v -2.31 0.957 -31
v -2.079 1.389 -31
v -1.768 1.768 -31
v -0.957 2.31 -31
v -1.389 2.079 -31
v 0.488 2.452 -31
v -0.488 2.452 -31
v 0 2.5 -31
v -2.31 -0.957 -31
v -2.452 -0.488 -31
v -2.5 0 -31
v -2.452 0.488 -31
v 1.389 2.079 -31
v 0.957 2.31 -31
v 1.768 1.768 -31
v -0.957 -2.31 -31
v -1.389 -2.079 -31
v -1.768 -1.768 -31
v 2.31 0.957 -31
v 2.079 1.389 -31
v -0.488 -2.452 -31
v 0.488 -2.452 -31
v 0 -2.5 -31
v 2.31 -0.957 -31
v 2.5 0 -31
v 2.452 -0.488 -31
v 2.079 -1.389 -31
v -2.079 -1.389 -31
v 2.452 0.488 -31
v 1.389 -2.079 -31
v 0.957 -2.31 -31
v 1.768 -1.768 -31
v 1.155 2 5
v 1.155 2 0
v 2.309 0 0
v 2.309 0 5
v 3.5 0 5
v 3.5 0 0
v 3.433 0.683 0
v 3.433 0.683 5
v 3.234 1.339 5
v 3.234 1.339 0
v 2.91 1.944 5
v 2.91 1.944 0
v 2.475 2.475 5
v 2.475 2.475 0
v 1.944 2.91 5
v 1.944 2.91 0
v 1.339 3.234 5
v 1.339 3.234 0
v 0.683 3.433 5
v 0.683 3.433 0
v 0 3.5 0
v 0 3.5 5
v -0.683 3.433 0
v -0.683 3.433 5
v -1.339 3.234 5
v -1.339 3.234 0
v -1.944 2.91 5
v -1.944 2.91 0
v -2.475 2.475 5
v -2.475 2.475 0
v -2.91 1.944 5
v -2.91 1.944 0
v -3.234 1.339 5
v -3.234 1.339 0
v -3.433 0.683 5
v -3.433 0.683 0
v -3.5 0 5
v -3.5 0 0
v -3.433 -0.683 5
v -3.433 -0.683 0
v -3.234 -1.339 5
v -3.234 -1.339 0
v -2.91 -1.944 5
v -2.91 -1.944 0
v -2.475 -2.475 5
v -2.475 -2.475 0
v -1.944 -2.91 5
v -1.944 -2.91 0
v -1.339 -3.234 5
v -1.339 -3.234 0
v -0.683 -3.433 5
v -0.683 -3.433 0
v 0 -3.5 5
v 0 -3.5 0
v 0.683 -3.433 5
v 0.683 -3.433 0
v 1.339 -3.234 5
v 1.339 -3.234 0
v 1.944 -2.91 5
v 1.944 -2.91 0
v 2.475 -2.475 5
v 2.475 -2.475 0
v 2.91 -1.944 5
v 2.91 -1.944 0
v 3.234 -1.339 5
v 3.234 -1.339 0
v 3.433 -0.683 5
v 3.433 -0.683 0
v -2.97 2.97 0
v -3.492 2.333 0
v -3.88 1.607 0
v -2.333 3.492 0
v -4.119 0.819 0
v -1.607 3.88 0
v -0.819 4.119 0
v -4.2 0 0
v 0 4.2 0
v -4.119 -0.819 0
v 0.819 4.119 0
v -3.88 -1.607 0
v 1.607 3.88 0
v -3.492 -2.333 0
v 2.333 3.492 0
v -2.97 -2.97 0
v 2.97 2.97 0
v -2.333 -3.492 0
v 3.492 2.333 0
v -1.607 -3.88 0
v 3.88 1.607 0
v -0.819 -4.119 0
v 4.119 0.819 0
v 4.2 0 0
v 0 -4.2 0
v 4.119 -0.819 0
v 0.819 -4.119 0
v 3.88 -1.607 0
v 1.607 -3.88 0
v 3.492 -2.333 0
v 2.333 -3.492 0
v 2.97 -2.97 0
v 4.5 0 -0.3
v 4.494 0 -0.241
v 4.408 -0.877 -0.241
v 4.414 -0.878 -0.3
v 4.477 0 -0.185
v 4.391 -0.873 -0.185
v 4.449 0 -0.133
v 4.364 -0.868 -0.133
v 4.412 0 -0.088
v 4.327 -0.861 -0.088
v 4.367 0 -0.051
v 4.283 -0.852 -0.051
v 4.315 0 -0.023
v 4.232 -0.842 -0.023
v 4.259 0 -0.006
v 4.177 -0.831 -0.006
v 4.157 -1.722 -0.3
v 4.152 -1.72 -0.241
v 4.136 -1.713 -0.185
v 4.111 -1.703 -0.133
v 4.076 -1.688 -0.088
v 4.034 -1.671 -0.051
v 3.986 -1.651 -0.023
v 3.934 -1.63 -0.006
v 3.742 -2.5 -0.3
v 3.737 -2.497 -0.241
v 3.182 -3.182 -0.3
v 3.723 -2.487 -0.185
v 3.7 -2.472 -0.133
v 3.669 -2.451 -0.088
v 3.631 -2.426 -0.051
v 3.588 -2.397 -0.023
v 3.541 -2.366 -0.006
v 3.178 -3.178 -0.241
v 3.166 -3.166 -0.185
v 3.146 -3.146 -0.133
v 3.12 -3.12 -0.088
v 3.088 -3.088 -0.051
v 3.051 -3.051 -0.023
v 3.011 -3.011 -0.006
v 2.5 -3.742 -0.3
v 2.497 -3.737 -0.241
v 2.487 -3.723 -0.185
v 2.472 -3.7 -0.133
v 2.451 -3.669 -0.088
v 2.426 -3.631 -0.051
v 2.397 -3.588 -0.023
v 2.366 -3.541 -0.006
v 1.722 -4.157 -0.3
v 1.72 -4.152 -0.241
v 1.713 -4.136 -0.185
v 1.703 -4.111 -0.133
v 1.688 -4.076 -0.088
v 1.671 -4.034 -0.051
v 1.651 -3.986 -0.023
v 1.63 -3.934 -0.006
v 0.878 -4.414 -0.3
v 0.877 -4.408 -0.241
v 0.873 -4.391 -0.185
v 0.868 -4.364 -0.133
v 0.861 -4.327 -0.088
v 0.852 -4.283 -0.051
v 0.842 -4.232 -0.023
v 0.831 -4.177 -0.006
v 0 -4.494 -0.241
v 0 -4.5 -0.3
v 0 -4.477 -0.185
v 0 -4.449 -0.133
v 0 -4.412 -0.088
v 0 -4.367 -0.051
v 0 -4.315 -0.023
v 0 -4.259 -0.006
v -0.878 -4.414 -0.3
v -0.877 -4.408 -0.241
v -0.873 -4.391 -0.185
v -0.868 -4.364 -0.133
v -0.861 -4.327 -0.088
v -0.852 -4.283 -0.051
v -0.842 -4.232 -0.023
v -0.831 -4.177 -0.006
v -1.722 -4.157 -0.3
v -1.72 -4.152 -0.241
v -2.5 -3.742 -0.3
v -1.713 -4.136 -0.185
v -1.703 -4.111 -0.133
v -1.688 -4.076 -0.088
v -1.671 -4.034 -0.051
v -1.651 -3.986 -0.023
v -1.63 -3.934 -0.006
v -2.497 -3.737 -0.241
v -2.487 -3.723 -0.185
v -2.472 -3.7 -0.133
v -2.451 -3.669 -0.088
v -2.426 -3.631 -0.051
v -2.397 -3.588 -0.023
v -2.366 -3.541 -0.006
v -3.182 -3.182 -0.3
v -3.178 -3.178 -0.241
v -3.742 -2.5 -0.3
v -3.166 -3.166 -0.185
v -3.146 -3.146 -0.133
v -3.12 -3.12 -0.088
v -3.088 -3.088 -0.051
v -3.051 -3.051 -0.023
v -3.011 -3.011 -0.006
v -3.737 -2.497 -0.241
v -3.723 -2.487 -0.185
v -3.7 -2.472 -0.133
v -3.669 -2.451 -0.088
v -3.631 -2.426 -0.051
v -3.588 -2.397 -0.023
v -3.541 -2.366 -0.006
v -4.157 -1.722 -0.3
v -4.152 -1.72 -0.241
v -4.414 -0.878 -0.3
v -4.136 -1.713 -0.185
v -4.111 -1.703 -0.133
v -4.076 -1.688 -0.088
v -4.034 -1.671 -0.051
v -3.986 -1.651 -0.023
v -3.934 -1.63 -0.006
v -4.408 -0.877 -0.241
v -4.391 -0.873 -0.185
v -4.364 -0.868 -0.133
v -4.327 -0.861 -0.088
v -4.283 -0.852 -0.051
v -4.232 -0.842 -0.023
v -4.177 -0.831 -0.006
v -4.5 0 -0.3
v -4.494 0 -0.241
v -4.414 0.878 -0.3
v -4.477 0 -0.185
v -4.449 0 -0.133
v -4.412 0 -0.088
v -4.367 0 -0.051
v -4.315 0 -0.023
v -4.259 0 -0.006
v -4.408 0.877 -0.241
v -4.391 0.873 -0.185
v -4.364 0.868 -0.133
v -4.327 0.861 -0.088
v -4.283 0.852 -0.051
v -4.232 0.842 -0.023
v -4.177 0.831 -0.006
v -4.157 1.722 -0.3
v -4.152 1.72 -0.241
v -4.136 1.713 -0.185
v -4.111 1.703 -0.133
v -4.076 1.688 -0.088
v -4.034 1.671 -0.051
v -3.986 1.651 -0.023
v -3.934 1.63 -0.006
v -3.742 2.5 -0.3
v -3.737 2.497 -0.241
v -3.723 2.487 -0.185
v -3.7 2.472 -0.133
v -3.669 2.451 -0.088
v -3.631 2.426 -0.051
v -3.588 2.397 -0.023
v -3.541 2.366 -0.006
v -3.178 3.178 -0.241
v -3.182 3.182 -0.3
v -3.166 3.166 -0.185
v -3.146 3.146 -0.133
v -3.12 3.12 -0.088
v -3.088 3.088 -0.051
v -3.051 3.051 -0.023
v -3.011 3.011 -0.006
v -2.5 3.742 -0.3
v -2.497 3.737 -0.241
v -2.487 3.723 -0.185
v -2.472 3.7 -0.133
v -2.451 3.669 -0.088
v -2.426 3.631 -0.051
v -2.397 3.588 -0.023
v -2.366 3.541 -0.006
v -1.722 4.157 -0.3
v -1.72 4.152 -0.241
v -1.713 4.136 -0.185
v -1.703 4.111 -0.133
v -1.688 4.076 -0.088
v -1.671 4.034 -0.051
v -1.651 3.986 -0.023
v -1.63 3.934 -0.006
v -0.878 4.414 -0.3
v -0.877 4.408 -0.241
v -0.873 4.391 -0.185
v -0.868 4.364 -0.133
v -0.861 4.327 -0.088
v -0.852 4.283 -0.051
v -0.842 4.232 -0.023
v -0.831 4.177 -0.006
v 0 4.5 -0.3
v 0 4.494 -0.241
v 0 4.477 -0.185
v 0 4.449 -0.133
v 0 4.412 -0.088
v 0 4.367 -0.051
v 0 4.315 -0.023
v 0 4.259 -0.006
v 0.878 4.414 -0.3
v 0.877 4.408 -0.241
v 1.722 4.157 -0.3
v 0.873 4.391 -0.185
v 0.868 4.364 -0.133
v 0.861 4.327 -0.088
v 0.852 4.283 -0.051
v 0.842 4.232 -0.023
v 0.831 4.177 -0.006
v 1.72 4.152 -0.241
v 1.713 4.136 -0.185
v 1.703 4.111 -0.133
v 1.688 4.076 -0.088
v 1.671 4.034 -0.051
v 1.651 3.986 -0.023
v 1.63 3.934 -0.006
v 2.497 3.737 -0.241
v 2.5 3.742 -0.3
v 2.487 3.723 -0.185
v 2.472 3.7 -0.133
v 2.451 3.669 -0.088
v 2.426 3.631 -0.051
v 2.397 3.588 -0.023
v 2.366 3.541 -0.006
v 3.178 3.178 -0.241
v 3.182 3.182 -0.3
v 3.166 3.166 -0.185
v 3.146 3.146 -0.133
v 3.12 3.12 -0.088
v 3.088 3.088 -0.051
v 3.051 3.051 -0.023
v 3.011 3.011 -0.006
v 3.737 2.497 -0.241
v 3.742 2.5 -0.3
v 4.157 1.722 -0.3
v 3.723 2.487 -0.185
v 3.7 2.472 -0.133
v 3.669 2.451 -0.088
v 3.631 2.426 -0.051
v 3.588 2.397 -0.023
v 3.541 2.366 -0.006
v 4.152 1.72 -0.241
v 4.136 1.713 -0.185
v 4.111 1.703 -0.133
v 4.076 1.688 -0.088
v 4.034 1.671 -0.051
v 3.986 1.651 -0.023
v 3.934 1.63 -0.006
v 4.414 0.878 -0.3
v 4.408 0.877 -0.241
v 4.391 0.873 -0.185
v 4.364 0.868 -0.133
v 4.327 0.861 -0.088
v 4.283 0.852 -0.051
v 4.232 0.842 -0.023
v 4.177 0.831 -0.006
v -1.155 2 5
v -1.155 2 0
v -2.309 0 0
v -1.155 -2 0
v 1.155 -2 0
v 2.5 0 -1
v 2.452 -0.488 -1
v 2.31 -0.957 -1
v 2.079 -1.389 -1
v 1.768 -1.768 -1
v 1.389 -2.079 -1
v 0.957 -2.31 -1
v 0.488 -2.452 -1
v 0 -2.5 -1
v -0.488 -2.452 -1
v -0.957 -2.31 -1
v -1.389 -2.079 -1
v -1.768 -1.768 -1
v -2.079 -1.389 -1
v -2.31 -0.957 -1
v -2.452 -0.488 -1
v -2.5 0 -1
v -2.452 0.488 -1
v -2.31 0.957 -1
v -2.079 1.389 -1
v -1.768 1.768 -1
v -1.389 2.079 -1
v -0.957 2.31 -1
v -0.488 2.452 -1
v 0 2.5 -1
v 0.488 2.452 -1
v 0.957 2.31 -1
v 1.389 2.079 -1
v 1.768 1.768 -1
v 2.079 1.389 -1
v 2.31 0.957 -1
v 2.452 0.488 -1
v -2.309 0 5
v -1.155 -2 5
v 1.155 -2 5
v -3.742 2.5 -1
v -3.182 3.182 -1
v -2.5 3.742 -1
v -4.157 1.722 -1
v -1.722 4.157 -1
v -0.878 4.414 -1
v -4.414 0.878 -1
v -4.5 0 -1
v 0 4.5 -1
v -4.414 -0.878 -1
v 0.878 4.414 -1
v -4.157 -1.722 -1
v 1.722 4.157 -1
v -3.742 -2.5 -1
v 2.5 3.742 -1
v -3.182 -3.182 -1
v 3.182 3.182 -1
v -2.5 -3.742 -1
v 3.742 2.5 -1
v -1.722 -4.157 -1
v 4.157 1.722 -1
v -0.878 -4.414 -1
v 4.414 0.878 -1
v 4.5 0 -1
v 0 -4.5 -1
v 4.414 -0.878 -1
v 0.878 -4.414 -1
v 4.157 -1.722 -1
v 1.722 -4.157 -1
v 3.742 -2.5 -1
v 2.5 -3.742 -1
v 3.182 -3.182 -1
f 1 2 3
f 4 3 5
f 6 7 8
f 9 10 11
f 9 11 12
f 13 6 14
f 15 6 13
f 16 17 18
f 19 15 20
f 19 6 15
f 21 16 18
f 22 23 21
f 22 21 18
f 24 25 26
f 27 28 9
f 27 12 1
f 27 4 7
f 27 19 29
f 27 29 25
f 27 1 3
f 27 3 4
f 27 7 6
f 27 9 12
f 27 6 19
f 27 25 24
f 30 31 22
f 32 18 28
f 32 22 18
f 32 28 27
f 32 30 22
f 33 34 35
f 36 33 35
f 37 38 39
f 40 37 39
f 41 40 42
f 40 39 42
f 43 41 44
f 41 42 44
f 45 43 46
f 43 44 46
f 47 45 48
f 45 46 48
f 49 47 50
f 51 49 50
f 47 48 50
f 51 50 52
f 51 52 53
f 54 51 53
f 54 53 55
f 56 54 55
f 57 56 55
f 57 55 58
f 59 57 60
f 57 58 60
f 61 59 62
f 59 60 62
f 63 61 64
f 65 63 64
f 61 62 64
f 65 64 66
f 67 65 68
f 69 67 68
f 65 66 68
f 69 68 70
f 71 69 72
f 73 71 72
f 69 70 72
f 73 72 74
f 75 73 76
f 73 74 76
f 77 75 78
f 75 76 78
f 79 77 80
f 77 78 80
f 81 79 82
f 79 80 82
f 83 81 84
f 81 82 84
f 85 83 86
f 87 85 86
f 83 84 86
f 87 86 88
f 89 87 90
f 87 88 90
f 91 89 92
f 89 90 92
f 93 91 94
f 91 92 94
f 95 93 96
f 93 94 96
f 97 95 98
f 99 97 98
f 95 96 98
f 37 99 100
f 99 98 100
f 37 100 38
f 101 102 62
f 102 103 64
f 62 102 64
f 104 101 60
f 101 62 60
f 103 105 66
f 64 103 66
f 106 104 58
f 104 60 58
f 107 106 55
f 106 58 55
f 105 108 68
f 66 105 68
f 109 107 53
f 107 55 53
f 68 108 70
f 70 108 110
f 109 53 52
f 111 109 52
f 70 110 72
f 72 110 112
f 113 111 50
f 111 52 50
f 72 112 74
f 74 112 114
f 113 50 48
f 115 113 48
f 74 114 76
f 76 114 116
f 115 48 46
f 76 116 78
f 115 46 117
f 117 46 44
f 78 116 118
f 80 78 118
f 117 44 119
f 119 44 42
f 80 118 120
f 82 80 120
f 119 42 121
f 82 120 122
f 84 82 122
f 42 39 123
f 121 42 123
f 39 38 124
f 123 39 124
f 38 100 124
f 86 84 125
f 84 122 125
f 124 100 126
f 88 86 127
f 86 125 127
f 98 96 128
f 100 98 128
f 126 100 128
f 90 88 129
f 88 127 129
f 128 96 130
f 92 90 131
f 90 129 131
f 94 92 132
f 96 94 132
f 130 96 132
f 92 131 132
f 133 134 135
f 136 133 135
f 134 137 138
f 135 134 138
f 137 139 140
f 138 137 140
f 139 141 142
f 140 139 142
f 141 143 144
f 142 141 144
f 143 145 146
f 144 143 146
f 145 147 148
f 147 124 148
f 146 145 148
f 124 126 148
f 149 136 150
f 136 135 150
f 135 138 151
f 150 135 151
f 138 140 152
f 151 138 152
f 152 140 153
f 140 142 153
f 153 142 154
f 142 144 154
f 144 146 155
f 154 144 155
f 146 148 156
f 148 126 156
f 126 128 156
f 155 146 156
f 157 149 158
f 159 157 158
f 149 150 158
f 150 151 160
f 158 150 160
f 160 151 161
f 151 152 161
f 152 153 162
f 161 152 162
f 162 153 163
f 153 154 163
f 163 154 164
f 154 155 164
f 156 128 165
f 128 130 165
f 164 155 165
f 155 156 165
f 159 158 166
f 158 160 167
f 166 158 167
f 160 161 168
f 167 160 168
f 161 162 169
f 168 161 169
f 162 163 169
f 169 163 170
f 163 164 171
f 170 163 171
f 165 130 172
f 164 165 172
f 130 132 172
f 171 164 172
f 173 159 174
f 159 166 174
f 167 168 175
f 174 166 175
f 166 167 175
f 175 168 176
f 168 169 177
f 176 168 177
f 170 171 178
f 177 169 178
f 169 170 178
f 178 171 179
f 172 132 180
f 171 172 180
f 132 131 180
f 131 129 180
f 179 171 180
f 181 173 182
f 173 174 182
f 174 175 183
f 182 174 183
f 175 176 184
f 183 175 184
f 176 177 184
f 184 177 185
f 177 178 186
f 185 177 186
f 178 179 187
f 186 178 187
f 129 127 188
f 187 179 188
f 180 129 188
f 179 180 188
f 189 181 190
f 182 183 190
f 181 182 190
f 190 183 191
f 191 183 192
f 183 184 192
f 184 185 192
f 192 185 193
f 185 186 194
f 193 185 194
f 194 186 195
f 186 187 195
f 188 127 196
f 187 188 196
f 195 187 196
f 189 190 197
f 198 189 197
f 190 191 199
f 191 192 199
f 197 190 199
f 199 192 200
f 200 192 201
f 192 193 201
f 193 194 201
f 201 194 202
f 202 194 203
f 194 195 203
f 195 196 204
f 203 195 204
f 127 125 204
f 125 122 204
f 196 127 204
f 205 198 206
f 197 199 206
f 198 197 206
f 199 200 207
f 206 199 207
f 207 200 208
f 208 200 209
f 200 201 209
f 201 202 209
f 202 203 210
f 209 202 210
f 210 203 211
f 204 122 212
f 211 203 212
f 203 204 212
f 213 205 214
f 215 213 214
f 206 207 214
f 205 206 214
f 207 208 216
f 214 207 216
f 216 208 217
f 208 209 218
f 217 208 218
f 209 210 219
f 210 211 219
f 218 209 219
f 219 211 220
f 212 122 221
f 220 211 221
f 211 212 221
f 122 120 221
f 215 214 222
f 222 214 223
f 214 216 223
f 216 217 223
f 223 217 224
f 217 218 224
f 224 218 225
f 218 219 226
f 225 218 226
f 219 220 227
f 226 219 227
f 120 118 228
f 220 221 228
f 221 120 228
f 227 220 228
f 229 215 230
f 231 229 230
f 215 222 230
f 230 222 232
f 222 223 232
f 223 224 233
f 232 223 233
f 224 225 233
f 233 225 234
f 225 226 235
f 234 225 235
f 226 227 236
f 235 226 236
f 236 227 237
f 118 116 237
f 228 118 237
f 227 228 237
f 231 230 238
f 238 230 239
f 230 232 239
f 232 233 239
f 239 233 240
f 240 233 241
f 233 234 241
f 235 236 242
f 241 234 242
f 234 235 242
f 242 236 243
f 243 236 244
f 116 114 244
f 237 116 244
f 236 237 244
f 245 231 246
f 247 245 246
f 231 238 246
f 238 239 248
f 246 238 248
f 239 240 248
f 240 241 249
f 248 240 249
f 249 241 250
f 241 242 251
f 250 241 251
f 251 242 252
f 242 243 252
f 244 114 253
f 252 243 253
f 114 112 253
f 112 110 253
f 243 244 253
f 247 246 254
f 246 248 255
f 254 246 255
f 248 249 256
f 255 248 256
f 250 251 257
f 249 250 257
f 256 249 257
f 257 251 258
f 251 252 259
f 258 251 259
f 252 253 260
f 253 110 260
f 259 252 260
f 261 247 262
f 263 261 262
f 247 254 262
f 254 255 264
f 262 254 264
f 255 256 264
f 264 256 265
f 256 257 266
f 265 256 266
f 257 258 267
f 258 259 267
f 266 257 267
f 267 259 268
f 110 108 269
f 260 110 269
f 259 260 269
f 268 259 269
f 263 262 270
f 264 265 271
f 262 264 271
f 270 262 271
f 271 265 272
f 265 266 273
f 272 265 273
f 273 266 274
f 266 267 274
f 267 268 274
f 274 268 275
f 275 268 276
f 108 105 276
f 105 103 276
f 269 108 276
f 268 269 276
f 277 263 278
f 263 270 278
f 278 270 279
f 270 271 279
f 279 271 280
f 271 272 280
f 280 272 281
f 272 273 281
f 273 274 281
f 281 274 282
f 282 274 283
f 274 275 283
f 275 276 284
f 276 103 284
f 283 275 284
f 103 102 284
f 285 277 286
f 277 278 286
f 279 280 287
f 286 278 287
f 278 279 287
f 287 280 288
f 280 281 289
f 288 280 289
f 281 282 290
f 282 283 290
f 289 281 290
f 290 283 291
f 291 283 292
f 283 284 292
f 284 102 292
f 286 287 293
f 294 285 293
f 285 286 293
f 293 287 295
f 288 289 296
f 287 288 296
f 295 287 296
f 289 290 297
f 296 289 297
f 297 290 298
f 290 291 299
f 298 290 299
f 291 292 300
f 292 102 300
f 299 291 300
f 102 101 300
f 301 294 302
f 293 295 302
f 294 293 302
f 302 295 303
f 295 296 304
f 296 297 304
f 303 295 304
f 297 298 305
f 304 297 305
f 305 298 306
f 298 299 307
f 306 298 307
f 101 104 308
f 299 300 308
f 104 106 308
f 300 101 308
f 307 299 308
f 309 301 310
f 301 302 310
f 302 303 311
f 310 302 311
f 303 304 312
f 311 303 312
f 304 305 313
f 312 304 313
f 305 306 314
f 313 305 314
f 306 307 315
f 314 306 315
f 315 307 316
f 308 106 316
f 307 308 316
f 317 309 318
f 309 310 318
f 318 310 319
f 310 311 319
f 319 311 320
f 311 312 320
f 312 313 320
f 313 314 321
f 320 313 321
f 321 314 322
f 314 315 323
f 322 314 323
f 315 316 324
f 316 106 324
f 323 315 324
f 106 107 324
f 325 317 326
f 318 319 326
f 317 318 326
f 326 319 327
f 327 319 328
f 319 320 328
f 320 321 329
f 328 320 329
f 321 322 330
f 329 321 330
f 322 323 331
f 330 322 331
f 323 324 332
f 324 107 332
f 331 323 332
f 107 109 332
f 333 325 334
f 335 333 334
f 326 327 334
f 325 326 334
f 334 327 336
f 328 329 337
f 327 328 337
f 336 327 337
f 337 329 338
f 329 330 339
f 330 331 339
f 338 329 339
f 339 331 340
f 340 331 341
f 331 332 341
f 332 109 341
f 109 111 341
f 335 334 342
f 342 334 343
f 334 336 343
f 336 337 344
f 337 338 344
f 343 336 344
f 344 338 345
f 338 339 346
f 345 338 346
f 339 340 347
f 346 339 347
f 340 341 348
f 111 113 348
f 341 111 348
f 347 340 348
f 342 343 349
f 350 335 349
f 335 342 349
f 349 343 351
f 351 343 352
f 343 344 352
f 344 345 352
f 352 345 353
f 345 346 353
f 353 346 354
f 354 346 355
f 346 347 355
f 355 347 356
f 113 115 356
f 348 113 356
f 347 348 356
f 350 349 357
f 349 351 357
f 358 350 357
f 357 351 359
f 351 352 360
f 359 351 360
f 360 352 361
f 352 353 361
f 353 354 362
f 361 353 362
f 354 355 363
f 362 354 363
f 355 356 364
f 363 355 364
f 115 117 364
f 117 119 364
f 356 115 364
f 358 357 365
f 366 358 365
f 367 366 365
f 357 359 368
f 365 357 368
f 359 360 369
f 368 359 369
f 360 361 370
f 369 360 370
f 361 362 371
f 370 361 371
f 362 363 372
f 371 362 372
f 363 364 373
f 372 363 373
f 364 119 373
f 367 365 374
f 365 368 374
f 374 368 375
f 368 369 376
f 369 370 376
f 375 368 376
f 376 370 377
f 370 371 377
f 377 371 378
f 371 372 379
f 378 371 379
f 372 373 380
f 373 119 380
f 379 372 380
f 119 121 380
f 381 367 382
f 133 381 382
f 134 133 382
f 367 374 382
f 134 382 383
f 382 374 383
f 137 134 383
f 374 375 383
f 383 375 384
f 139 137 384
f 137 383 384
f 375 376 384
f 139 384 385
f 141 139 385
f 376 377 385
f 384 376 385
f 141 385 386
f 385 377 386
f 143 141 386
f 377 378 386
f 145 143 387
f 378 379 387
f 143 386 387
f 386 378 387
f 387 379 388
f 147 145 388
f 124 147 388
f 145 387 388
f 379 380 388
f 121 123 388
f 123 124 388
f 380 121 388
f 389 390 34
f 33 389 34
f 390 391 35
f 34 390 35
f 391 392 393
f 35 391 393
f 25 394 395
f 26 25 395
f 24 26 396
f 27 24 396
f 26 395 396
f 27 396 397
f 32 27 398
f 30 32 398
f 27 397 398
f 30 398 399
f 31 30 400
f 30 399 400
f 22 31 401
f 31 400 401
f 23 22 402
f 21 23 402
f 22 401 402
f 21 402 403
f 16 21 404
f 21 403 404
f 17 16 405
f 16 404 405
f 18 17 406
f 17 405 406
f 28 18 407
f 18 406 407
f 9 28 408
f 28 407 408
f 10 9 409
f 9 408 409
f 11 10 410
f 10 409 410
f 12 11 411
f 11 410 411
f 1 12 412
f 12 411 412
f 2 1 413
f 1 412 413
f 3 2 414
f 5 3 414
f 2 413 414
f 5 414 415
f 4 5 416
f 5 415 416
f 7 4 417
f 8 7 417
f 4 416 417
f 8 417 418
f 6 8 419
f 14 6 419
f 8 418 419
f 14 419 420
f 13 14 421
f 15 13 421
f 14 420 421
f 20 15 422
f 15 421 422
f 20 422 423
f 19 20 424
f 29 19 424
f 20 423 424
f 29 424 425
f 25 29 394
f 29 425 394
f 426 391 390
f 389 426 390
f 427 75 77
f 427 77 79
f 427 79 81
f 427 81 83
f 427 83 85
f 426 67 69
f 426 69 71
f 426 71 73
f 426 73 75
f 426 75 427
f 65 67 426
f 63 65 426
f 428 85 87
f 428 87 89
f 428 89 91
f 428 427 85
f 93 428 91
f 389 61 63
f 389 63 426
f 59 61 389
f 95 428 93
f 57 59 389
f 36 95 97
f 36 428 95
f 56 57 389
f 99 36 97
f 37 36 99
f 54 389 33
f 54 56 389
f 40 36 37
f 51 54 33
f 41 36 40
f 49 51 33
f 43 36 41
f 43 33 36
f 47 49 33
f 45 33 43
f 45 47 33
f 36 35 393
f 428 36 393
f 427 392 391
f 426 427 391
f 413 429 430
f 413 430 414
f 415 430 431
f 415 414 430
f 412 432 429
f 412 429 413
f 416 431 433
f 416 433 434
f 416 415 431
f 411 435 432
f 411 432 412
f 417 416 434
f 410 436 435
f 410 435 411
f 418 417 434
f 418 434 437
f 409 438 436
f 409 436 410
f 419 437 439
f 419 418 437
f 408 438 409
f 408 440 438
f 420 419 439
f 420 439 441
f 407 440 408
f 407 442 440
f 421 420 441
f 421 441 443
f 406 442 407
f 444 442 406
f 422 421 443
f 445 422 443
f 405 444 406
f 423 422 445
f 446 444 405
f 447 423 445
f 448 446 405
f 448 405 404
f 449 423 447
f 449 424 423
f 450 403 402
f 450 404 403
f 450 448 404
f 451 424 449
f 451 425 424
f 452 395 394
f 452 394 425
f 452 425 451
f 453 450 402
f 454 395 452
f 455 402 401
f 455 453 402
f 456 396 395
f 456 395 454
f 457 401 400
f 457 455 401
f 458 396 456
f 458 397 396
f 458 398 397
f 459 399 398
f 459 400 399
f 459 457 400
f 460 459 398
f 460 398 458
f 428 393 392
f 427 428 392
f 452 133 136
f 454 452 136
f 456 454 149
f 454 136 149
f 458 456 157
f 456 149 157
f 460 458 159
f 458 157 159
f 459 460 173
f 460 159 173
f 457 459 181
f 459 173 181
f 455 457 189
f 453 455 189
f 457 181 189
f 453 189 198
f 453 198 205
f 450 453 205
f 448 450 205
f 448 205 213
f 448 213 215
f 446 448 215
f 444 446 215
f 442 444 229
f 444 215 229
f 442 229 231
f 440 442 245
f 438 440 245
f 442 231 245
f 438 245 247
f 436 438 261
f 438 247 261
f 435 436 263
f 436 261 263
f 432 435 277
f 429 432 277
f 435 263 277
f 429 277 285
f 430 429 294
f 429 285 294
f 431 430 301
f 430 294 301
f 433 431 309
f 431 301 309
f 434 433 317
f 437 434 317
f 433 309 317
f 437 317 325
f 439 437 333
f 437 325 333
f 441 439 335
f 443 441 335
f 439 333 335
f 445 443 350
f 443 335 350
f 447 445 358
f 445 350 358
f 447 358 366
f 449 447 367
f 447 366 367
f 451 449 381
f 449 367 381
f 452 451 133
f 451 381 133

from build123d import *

# Parameters (mm, degrees)
F0_R     = 3.5
F1_DEPTH = 5
F2_R     = 4.5
F3_DEPTH = 1
F4_R     = 2.5
F5_DEPTH = 30
F6_R     = 0.3


with BuildPart() as f1:
    # F0 (on Top) → F1 (new body)
    with BuildSketch(Plane.XY):
        Circle(F0_R)
        Polygon((-2.309401, 0), (-1.154701, 2), (1.154701, 2), (2.309401, 0), (1.154701, -2), (-1.154701, -2), align=None, mode=Mode.SUBTRACT)
    extrude(amount=F1_DEPTH)

    # F2 (on face) → F3 (join)
    with BuildSketch(Plane(origin=(0, 0, 0), x_dir=(1, 0, 0), z_dir=(0, 0, -1))):
        Circle(F2_R)
    extrude(amount=F3_DEPTH)

    # F4 (on face) → F5 (join)
    with BuildSketch(Plane(origin=(0, 0, -1), x_dir=(1, 0, 0), z_dir=(0, 0, -1))):
        Circle(F4_R)
    extrude(amount=F5_DEPTH)

    # F6
    f6_edges = [f1.edges().sort_by_distance(p)[0] for p in [
        (-4.5, 0, 0),
    ]]
    fillet(f6_edges, radius=F6_R)


solid = f1.part
